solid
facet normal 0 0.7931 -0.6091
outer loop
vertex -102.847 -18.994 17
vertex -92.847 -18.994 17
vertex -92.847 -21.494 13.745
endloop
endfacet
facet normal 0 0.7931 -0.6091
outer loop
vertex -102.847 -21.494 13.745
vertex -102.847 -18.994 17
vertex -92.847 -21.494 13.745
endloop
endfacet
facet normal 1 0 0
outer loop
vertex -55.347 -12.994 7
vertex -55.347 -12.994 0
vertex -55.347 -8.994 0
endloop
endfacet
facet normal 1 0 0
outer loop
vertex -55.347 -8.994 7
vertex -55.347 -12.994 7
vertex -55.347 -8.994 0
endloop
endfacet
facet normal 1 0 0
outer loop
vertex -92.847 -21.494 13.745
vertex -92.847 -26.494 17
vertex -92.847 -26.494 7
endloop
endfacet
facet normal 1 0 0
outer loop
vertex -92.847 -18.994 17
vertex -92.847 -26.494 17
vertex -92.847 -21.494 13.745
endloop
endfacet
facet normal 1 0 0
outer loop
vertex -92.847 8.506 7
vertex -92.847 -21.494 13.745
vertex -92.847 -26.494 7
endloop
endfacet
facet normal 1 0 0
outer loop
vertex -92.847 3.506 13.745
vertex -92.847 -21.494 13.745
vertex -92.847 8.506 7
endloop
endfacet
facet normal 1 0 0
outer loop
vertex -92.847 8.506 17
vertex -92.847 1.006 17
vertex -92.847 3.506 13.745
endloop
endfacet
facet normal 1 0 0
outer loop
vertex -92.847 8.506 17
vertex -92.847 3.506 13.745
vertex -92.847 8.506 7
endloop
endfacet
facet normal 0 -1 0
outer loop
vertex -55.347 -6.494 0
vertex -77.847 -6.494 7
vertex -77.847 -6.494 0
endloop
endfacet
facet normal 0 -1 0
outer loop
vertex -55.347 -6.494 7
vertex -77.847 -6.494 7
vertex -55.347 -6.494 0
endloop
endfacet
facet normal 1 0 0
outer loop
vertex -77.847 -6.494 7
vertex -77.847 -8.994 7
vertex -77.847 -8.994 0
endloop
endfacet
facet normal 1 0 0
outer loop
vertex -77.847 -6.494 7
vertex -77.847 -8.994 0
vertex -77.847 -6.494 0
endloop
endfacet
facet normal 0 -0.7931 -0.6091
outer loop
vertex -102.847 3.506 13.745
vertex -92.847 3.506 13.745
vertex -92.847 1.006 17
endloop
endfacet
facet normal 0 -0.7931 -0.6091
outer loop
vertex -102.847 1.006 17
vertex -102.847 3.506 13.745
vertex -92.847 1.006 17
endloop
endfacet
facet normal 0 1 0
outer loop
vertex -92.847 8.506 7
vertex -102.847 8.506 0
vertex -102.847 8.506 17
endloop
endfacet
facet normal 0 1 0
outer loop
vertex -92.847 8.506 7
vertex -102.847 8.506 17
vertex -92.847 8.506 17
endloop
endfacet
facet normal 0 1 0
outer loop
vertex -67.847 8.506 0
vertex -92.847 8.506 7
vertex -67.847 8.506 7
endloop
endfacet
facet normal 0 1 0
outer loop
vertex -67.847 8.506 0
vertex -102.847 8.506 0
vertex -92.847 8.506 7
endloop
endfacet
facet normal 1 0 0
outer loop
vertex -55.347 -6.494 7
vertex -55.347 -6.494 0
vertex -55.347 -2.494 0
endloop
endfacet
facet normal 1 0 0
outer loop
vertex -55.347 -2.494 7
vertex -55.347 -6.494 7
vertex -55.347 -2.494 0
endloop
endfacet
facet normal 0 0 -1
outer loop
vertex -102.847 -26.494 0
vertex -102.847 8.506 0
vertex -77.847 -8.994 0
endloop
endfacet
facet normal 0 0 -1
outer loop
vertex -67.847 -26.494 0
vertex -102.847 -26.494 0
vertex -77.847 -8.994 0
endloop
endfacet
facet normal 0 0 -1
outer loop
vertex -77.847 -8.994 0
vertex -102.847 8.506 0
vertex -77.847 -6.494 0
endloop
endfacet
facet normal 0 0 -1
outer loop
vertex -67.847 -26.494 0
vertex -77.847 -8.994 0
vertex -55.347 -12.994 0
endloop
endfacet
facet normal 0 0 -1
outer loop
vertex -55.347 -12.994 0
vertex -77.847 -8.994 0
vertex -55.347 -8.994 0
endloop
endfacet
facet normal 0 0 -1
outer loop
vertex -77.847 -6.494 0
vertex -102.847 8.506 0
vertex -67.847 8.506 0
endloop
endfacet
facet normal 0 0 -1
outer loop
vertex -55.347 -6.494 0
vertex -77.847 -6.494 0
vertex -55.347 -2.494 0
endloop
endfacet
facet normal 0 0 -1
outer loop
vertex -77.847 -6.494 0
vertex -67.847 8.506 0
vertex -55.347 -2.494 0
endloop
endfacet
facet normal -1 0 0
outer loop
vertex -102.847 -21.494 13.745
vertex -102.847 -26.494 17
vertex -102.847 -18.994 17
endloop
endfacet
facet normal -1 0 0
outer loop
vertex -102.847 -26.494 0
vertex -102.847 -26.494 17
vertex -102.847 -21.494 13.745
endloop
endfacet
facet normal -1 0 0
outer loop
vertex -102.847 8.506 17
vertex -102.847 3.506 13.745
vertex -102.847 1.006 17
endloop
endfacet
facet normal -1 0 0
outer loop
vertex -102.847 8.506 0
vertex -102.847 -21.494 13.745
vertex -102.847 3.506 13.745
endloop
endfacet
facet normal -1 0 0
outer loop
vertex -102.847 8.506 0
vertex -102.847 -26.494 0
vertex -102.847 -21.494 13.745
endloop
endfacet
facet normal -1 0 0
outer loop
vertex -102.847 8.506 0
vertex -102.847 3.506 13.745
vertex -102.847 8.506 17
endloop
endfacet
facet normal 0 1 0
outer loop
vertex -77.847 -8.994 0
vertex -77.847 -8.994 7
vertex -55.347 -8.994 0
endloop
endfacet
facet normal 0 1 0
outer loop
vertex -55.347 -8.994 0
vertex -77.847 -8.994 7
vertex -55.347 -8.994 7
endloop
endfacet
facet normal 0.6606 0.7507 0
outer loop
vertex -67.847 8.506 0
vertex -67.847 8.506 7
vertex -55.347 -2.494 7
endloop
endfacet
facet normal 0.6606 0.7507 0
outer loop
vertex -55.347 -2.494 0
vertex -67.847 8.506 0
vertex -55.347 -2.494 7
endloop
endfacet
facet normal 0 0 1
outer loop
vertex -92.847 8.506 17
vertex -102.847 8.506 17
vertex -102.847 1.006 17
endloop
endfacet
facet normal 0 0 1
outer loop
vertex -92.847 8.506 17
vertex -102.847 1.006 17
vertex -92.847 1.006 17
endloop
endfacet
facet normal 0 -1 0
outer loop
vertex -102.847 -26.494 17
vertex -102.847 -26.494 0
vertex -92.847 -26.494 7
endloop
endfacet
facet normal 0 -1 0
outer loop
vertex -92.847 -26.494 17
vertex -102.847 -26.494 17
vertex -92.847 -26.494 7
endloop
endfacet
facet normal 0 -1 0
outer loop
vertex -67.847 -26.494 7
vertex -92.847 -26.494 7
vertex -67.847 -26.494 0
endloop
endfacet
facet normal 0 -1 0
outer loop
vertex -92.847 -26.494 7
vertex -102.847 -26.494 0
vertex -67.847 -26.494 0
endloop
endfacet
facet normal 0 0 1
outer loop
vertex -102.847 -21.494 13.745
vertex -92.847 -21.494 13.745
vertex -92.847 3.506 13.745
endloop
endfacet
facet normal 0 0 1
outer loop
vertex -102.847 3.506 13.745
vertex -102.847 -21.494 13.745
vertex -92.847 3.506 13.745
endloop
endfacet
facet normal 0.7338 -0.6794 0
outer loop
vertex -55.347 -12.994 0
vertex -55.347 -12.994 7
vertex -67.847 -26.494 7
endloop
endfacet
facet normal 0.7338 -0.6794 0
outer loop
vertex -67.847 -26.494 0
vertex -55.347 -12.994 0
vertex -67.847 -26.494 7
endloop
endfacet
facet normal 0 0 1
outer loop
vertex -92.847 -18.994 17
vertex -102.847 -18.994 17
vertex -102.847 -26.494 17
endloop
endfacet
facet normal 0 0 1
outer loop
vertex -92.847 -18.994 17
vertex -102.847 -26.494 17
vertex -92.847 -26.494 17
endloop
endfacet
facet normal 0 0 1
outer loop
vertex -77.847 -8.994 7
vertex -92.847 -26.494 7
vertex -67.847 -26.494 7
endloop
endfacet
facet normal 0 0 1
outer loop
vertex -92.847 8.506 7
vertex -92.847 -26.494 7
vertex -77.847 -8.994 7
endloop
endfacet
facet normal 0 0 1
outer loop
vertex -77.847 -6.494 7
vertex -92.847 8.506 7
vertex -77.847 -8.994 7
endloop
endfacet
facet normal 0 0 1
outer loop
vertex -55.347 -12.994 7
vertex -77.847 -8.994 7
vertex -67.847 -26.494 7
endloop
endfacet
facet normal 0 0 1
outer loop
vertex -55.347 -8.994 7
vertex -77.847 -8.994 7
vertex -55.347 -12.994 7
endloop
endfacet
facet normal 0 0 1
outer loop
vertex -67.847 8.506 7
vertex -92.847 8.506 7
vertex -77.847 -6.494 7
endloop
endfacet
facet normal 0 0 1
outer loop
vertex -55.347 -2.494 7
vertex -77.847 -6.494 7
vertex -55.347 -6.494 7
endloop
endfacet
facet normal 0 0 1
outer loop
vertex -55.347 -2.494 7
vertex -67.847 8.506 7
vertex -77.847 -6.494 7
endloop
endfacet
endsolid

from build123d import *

# Parameters (mm, degrees)
F0_W      = 47.5
F0_H      = 35
F1_DEPTH  = 17
F2_W      = 37.5
F2_H      = 35
F3_DEPTH  = 10
F5_DEPTH  = 10.001
F6_W      = 22.5
F6_H      = 2.5
F7_DEPTH  = 7.001
F9_DEPTH  = 7.001
F11_DEPTH = 7.001


with BuildPart() as f1:
    # F0 (on Top) → F1 (new body)
    with BuildSketch(Plane.XY):
        with Locations((-79.0966801345, -8.9940691388)):
            Rectangle(F0_W, F0_H)
    extrude(amount=F1_DEPTH)

    # F2 (on face) → F3 (cut)
    with BuildSketch(Plane.XY.offset(17)):
        with Locations((-74.0966801345, -8.9940691388)):
            Rectangle(F2_W, F2_H)
    extrude(amount=-F3_DEPTH, mode=Mode.SUBTRACT)

    # F4 (on face) → F5 (cut, through all)
    with BuildSketch(Plane.YZ.offset(-92.8466801345)):
        Polygon((1.0059308612, 17), (-18.9940691388, 17), (-21.4939605839, 13.7453228235), (3.5060394161, 13.7453228235), align=None)
    extrude(amount=-F5_DEPTH, mode=Mode.SUBTRACT)

    # F6 (on face) → F7 (cut, through all)
    with BuildSketch(Plane.XY.offset(7)):
        with Locations((-66.5966801345, -7.7440691388)):
            Rectangle(F6_W, F6_H)
    extrude(amount=-F7_DEPTH, mode=Mode.SUBTRACT)

    # F8 (on face) → F9 (cut, through all)
    with BuildSketch(Plane.XY.offset(7)):
        Polygon((-55.3466801345, 8.5059308612), (-67.8466801345, 8.5059308612), (-55.3466801345, -2.4940691388), align=None)
    extrude(amount=-F9_DEPTH, mode=Mode.SUBTRACT)

    # F10 (on face) → F11 (cut, through all)
    with BuildSketch(Plane.XY.offset(7)):
        Polygon((-55.3466801345, -26.4940691388), (-55.3466801345, -12.9940691388), (-67.8466801345, -26.4940691388), align=None)
    extrude(amount=-F11_DEPTH, mode=Mode.SUBTRACT)


solid = f1.part
